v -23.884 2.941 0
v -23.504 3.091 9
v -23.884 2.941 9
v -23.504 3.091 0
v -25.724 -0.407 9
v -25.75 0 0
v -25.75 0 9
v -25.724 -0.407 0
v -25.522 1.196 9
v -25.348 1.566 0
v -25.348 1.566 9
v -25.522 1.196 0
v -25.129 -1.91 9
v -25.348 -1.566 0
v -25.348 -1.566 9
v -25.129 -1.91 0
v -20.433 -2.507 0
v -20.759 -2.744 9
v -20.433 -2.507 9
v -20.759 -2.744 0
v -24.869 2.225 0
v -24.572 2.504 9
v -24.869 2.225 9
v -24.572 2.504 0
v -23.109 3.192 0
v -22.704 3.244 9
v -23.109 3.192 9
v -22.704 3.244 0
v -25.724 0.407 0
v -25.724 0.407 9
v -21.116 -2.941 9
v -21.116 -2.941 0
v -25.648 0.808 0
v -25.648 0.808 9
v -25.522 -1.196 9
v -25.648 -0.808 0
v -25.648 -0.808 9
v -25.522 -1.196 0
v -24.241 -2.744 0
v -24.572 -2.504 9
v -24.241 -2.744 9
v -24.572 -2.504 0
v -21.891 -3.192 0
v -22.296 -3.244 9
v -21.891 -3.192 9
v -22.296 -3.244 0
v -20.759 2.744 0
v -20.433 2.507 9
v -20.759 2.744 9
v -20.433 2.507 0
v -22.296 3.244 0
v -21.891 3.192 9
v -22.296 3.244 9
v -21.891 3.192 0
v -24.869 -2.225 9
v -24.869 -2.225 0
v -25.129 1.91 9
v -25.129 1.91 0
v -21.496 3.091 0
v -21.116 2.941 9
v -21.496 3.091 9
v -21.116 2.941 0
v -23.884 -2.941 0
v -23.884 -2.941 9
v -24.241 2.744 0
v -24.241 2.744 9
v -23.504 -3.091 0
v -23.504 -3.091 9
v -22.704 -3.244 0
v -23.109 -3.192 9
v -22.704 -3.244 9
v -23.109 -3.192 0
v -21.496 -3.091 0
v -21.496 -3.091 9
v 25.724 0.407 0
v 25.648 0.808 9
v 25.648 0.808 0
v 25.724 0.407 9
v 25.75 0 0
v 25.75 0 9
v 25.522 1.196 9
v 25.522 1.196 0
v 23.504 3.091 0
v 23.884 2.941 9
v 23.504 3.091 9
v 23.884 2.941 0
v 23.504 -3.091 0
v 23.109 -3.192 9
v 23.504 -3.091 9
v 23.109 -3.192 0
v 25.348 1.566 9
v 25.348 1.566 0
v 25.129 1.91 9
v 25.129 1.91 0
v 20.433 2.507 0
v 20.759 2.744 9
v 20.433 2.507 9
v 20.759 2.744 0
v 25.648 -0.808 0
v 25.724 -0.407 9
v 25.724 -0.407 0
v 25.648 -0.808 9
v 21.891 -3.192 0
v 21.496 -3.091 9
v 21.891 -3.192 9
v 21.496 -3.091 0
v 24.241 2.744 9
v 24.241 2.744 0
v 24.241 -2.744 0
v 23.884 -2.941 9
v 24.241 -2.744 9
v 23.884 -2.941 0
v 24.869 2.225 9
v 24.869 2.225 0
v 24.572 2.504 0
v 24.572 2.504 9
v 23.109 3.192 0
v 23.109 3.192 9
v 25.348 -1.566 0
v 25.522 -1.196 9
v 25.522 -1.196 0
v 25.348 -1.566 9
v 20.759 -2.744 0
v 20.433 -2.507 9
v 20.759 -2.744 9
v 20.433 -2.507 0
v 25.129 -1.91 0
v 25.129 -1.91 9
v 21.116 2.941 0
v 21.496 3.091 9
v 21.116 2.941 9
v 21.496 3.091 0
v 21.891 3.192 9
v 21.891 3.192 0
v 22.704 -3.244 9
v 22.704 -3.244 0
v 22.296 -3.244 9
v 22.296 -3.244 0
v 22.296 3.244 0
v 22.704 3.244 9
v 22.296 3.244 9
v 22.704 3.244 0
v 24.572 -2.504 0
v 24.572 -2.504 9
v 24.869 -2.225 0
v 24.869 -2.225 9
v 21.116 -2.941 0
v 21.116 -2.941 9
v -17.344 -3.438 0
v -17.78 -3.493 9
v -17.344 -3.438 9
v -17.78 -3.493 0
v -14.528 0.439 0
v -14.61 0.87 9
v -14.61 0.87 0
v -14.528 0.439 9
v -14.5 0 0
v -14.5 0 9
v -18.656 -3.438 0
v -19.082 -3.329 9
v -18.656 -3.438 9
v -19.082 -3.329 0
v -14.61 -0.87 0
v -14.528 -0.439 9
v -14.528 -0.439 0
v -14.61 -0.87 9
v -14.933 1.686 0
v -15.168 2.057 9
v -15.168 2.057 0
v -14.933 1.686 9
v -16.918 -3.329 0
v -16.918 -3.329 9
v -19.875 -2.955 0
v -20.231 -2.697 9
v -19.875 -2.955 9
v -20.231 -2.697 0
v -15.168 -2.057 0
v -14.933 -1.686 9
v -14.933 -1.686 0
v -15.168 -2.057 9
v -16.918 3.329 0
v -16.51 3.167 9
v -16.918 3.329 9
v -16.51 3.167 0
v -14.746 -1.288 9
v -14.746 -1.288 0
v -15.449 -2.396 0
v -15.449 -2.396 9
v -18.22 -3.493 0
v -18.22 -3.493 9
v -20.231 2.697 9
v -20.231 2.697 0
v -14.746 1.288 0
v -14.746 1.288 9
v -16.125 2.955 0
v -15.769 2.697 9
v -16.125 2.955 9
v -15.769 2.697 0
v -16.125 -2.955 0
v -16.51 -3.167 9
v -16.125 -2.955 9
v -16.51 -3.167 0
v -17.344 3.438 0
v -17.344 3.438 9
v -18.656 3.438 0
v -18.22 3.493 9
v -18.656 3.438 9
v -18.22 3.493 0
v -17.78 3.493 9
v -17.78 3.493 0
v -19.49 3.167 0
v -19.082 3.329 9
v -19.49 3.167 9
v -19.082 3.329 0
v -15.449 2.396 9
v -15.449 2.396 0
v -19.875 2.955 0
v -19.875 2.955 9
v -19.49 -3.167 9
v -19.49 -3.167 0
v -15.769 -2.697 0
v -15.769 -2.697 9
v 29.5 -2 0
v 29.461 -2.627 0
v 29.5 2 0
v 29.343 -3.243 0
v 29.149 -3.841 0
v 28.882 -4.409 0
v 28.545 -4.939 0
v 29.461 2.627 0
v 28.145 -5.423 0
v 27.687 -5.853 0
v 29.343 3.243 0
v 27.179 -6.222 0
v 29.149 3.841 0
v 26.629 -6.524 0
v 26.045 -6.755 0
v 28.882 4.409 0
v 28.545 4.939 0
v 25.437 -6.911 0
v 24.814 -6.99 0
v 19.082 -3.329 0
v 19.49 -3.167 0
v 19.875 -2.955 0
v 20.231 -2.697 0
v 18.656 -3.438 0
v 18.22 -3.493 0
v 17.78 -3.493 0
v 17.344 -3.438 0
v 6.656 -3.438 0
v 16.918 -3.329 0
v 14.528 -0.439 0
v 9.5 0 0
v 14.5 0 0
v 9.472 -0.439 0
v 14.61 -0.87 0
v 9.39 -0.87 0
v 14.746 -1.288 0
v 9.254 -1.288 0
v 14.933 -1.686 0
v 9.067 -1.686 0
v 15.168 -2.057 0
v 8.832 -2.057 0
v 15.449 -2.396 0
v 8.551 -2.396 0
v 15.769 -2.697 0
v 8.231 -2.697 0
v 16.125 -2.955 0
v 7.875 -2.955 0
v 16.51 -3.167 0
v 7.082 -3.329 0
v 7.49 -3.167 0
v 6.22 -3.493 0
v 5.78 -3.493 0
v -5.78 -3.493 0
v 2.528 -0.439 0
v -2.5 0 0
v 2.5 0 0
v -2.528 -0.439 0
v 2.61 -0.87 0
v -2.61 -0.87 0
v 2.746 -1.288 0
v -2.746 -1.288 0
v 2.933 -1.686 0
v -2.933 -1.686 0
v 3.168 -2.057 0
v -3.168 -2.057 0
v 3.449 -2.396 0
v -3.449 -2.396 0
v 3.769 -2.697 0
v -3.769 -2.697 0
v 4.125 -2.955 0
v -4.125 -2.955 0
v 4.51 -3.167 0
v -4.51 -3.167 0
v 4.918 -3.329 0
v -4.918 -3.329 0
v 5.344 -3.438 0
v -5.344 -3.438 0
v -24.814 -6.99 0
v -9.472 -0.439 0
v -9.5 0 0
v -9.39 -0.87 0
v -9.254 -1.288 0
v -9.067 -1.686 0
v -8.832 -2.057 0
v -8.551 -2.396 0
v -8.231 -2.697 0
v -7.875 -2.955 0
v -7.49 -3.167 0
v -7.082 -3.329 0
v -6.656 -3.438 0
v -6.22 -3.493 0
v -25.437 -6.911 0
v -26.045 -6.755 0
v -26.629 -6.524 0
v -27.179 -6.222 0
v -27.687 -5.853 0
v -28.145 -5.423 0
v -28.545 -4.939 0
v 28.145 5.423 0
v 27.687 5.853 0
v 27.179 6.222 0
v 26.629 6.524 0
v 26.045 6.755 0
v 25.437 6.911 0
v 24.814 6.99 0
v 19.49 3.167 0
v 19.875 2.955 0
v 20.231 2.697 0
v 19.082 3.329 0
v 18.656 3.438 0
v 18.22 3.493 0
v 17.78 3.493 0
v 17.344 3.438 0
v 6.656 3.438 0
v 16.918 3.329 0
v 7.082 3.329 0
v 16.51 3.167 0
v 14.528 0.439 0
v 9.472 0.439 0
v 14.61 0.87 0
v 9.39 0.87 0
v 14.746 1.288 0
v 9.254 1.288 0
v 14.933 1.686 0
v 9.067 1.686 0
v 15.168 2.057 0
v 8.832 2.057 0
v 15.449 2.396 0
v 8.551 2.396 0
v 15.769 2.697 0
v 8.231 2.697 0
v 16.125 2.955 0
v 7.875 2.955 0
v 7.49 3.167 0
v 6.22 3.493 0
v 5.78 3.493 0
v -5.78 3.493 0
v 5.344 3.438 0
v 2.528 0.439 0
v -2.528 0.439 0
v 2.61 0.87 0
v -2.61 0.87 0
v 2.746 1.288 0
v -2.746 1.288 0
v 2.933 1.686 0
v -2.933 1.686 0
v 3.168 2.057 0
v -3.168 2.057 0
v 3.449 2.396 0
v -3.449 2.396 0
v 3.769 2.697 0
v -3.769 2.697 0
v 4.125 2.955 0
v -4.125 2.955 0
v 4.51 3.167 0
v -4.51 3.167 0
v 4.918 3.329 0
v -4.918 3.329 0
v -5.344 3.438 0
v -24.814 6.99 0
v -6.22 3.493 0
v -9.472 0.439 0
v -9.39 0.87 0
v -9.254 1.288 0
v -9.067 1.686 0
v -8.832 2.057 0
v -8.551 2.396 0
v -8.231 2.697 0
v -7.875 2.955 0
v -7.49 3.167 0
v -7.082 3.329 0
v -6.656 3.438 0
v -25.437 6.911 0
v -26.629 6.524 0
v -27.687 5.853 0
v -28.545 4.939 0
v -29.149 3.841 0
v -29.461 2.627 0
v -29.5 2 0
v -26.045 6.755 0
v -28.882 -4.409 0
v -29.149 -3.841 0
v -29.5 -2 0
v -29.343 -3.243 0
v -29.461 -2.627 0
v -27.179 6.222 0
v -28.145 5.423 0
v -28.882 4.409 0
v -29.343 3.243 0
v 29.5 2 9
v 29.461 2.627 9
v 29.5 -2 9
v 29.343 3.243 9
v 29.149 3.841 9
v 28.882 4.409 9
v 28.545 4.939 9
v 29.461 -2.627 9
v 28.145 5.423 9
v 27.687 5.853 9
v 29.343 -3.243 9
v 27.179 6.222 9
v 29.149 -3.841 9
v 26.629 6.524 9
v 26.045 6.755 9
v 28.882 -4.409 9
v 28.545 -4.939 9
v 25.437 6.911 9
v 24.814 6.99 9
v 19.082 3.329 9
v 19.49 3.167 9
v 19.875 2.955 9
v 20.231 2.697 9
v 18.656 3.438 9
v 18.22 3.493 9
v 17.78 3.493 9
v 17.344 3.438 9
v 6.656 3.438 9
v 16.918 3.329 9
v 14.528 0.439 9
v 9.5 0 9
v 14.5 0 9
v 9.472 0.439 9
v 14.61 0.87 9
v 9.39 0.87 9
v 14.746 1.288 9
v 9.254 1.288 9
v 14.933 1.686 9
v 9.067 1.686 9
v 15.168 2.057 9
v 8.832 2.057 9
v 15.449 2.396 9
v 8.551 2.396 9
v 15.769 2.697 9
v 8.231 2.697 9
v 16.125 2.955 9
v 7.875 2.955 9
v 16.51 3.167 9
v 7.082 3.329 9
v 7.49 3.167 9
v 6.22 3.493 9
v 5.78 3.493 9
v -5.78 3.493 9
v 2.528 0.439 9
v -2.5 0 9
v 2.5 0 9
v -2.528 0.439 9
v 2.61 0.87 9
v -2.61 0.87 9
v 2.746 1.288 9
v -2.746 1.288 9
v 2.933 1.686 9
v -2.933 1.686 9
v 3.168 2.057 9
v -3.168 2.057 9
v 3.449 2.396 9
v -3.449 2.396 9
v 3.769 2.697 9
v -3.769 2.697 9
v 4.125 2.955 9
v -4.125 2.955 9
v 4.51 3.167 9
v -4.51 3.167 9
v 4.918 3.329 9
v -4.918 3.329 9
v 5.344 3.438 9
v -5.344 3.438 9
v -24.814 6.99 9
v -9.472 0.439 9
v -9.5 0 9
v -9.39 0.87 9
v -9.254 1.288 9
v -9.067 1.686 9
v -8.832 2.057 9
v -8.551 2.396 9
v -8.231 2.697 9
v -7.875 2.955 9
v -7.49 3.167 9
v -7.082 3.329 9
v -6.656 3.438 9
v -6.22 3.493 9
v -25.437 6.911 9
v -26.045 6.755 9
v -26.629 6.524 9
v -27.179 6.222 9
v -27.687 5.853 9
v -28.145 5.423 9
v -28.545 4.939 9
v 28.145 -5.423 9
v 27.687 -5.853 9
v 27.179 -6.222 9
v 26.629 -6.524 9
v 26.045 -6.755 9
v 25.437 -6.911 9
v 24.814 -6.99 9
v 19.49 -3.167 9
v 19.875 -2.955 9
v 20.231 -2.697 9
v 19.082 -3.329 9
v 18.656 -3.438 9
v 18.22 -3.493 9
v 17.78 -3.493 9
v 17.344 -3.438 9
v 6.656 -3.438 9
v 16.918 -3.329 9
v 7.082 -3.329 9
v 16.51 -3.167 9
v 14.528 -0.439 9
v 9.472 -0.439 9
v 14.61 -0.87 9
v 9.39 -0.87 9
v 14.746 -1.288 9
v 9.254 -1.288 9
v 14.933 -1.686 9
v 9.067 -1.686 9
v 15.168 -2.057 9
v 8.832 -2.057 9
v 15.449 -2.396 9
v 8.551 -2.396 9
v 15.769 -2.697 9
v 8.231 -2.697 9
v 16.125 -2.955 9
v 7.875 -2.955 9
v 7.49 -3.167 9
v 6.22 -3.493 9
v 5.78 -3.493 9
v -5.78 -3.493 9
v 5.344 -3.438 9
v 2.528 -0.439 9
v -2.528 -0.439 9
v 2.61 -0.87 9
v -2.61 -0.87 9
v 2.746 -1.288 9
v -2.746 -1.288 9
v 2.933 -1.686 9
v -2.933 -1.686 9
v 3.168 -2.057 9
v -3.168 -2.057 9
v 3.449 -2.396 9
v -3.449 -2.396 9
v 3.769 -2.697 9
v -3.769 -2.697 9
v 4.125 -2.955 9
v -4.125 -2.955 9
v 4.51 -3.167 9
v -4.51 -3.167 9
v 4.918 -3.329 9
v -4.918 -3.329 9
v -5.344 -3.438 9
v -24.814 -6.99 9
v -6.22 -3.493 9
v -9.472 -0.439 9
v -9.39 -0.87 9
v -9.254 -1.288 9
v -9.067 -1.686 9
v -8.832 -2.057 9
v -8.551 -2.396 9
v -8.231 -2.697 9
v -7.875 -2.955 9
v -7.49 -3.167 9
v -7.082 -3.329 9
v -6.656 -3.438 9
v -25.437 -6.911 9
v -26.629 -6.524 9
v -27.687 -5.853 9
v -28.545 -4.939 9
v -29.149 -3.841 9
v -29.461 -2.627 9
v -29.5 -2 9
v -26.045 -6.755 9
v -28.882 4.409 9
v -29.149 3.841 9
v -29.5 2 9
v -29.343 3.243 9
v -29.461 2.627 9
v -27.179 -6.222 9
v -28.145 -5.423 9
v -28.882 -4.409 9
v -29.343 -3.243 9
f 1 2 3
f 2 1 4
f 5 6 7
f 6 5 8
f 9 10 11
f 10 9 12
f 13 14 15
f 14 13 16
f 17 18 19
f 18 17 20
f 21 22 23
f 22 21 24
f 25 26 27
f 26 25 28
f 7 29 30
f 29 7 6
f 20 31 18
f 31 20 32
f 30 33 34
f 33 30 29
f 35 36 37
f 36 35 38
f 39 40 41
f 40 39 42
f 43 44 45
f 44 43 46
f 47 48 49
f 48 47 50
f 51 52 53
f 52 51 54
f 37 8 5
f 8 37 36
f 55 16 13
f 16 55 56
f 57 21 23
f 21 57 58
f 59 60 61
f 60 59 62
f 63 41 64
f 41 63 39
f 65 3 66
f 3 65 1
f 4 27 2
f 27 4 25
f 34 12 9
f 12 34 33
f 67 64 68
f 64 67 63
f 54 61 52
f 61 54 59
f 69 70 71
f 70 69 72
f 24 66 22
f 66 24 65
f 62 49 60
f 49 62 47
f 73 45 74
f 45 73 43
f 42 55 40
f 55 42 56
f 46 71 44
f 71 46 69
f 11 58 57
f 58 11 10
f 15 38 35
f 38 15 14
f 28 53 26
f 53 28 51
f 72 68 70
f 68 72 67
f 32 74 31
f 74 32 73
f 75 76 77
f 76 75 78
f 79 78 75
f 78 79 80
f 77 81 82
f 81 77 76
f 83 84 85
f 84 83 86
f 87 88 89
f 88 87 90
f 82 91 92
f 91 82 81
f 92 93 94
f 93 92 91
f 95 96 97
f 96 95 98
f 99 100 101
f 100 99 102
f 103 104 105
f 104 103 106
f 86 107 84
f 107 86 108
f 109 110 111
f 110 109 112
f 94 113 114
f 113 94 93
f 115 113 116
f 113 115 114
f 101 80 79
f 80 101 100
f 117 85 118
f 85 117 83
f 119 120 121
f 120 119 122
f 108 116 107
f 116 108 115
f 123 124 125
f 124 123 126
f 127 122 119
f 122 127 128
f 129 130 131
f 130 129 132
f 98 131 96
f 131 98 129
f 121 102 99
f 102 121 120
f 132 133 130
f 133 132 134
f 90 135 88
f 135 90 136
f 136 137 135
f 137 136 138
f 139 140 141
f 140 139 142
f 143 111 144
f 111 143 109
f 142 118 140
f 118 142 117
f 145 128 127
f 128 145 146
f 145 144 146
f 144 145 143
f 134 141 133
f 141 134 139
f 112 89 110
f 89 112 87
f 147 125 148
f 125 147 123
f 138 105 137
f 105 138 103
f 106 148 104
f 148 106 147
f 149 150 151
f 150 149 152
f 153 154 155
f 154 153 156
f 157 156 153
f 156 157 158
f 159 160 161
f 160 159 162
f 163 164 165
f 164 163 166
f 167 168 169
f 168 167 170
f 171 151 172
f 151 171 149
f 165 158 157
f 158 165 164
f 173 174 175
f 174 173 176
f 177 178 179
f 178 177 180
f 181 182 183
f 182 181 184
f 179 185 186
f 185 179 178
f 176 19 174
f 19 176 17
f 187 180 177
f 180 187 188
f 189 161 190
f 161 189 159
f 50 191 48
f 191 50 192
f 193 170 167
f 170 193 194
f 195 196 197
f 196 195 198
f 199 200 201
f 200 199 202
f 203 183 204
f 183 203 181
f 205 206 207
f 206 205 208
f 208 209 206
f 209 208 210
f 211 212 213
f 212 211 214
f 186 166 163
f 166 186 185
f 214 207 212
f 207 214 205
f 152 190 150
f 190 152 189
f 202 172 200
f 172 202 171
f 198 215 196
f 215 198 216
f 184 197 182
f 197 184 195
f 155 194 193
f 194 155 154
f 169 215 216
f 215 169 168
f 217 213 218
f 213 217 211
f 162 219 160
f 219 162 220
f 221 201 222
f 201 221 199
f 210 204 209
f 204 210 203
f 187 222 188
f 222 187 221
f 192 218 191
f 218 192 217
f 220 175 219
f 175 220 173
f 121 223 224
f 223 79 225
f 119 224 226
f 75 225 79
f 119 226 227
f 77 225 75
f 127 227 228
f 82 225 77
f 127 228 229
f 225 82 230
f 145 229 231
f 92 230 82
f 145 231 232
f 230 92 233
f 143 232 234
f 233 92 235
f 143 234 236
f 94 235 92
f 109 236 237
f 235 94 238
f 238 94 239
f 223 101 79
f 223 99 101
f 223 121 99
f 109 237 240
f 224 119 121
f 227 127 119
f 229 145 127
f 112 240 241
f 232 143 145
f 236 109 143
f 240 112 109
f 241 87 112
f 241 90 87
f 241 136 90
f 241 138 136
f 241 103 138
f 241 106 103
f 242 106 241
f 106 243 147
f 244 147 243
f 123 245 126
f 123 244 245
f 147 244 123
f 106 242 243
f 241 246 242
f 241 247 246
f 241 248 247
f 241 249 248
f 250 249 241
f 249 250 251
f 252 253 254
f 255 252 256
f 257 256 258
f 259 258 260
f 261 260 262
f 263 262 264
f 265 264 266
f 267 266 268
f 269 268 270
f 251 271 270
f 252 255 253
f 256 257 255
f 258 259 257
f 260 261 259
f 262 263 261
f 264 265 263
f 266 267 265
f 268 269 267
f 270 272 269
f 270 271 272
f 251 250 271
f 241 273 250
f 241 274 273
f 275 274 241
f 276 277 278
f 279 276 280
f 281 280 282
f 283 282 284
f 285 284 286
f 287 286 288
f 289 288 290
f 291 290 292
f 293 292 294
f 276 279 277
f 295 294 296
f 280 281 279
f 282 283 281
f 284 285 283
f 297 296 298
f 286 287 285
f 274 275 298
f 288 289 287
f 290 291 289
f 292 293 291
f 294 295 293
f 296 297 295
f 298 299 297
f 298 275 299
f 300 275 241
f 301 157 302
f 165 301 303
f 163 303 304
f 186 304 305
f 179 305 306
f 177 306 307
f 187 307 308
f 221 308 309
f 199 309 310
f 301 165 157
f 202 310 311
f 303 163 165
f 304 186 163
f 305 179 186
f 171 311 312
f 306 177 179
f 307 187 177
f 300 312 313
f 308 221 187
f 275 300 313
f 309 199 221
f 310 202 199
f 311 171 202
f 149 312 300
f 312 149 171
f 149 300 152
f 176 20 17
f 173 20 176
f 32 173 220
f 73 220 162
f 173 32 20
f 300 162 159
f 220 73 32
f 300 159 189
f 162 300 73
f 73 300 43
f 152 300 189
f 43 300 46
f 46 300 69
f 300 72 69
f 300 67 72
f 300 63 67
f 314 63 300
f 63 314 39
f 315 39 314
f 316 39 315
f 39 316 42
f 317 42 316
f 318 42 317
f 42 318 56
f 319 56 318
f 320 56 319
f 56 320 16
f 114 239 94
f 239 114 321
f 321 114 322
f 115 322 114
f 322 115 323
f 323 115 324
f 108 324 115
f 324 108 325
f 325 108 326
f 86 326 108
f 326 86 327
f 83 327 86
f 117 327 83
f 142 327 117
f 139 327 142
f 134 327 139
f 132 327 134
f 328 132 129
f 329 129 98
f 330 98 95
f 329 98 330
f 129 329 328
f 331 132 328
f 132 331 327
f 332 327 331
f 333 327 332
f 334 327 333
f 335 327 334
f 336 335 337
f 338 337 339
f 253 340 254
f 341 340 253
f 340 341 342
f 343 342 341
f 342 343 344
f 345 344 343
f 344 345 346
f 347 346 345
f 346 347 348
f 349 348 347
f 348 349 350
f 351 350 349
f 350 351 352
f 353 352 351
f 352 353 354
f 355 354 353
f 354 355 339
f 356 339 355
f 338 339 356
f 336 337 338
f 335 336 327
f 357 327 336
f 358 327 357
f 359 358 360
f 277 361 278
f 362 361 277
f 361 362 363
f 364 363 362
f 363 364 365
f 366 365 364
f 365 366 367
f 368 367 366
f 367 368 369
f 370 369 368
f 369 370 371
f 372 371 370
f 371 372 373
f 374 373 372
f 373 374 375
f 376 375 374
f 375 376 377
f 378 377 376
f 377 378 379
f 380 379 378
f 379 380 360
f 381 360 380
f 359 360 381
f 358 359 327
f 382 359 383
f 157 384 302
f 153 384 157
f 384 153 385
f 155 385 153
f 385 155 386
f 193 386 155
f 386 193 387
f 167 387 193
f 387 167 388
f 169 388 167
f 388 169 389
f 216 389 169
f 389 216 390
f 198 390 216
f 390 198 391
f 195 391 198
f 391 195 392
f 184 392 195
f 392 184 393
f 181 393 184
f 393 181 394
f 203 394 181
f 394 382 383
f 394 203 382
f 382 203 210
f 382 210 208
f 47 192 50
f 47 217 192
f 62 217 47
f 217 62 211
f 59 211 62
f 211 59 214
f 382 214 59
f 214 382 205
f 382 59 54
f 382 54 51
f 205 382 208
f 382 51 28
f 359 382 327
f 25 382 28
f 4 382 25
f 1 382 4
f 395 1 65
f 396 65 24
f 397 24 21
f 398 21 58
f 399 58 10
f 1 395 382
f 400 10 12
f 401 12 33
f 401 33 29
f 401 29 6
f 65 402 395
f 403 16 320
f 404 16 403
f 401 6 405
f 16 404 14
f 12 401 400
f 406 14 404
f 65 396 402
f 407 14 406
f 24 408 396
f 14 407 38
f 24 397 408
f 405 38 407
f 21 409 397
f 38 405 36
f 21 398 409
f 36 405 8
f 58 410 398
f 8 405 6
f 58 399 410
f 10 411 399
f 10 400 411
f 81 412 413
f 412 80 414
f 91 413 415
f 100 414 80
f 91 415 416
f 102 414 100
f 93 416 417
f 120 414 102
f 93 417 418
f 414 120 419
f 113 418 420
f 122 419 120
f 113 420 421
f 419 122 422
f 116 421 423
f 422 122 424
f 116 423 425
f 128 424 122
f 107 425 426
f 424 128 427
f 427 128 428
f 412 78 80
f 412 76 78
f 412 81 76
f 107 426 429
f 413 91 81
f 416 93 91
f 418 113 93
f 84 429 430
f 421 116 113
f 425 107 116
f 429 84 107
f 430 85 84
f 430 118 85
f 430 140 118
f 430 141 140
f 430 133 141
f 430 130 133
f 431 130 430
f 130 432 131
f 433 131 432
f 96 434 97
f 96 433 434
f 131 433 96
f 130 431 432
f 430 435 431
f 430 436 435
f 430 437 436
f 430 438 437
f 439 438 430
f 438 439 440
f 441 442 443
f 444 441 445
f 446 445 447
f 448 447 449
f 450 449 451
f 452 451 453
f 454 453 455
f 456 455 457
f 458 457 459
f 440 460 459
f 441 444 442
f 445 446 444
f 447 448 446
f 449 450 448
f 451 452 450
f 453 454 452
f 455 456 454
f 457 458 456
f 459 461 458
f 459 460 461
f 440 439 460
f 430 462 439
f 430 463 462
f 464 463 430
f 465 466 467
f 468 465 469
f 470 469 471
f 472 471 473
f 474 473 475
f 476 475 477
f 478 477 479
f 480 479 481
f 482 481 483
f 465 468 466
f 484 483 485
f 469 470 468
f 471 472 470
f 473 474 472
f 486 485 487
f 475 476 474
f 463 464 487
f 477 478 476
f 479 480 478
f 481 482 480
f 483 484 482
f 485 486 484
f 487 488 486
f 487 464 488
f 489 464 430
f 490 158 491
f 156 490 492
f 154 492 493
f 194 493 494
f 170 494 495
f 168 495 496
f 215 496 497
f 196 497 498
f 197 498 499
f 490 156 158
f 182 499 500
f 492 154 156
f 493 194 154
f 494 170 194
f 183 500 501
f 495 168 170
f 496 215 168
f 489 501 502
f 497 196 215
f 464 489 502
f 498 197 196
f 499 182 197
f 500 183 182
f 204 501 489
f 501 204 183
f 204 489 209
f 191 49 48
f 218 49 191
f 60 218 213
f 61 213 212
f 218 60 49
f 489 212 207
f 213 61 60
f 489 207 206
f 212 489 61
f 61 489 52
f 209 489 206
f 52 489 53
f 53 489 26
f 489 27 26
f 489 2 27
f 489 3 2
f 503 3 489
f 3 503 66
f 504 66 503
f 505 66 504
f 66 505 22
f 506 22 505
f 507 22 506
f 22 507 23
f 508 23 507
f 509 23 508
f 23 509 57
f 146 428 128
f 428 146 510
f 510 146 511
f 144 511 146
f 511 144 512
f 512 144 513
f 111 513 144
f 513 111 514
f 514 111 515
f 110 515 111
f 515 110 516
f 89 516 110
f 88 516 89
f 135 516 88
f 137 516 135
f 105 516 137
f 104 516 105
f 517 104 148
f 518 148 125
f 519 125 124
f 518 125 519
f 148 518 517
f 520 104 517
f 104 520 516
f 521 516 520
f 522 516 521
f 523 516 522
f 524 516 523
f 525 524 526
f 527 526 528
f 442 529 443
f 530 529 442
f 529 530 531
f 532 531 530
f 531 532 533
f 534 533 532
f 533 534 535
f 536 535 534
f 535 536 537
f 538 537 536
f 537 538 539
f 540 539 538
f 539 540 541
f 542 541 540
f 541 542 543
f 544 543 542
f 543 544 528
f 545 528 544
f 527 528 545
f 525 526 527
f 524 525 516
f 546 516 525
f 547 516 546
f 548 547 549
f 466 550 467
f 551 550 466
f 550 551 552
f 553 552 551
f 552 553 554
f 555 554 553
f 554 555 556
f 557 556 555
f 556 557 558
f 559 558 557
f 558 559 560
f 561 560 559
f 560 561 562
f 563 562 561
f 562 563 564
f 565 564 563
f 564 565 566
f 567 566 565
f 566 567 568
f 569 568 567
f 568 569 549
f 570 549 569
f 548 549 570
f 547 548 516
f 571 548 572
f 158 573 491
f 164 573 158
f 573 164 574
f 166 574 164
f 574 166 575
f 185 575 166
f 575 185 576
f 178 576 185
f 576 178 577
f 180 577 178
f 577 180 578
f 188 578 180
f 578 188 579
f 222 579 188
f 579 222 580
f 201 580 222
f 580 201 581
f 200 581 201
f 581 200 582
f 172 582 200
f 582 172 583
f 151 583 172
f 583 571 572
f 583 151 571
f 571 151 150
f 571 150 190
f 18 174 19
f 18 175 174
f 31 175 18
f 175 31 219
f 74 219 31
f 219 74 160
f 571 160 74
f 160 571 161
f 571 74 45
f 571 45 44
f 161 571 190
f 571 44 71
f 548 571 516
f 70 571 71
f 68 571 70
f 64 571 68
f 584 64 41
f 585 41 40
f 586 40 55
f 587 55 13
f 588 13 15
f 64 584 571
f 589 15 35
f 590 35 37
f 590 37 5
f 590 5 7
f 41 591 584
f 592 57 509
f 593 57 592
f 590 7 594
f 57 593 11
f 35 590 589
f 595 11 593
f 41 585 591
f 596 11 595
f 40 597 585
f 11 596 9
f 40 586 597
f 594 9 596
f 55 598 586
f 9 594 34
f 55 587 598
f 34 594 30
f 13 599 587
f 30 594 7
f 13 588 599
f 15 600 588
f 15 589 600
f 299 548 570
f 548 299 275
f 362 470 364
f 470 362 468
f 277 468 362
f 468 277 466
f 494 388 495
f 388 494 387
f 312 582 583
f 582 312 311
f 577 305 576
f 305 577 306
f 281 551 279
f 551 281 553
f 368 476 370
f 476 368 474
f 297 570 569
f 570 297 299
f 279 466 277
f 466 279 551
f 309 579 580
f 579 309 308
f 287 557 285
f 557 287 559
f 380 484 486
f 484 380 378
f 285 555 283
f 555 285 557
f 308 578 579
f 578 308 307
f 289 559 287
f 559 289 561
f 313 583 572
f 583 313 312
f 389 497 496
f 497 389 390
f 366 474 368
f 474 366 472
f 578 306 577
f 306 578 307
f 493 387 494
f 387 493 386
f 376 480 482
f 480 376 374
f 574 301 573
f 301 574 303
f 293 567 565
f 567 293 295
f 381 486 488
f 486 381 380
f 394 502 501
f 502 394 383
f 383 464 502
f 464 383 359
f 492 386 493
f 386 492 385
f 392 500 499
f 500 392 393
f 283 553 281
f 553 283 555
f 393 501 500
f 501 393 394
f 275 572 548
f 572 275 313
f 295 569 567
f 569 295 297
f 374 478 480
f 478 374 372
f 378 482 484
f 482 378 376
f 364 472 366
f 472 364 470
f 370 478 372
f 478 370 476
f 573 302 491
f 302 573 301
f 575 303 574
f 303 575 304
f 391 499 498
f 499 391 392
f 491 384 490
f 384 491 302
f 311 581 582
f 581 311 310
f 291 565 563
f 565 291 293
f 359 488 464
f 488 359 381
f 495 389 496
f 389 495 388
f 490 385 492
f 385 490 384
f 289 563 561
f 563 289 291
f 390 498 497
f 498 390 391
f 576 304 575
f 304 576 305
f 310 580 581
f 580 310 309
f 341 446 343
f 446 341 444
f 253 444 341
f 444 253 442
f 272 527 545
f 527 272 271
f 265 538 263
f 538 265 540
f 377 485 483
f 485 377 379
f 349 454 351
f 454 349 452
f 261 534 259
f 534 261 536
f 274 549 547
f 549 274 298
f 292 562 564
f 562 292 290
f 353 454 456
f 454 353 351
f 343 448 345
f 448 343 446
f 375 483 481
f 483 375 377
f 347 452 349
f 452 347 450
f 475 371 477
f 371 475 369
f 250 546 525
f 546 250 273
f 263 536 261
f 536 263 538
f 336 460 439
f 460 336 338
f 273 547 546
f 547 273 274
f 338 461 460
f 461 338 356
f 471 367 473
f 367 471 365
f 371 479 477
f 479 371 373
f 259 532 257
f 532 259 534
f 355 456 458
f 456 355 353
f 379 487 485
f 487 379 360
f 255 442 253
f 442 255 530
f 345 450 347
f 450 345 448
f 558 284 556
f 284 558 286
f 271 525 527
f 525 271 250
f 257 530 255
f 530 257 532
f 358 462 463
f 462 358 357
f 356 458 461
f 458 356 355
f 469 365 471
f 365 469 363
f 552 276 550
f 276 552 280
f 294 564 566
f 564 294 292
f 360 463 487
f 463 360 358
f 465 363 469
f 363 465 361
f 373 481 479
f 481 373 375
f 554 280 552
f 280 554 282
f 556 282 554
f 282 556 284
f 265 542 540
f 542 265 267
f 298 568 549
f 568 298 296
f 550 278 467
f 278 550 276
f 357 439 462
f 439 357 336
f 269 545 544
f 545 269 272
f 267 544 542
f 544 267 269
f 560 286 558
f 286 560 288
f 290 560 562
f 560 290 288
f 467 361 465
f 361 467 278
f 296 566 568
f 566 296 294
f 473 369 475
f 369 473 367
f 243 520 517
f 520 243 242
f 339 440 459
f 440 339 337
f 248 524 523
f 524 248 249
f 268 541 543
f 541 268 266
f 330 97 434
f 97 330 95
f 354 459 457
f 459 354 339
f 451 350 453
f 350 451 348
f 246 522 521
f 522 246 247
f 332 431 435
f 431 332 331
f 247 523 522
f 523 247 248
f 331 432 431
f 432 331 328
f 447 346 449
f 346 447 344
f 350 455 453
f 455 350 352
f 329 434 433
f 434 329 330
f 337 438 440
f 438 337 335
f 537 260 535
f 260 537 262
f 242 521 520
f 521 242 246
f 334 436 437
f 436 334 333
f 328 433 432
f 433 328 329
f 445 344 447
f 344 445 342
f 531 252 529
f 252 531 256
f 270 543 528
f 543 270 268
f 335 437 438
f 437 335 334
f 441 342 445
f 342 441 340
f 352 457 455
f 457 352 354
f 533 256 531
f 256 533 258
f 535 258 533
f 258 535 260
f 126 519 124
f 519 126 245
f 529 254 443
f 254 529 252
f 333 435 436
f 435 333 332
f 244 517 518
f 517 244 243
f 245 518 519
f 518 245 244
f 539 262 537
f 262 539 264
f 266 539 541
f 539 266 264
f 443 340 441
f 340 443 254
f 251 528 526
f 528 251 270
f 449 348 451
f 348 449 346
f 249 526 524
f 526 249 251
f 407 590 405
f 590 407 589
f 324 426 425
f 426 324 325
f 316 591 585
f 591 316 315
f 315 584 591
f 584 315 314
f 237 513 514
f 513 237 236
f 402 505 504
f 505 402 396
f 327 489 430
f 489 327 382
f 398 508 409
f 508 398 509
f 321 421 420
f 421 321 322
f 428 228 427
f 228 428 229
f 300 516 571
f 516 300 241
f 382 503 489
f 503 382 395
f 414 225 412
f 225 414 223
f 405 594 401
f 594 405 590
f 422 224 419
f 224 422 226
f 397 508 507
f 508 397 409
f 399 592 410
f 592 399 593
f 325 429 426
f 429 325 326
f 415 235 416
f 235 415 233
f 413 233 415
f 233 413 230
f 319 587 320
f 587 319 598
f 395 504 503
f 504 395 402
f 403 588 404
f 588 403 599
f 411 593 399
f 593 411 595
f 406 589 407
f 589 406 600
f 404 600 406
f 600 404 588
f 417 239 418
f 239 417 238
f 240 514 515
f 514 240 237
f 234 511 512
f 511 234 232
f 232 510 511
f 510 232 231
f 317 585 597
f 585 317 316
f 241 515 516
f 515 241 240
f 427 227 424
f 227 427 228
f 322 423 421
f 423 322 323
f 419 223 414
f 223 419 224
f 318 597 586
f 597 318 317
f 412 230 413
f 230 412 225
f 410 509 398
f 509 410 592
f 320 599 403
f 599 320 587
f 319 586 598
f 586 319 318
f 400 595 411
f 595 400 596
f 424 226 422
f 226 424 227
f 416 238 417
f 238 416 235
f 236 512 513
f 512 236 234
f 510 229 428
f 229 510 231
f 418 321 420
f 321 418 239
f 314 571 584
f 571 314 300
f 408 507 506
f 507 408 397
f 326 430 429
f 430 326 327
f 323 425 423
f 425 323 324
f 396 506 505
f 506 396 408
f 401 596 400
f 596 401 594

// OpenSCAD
$fn = 50;


difference() {
	union() {
		hull() {
			translate(v = [-24.5000000000, 2.0000000000, 0]) {
				cylinder(h = 9, r = 5);
			}
			translate(v = [24.5000000000, 2.0000000000, 0]) {
				cylinder(h = 9, r = 5);
			}
			translate(v = [-24.5000000000, -2.0000000000, 0]) {
				cylinder(h = 9, r = 5);
			}
			translate(v = [24.5000000000, -2.0000000000, 0]) {
				cylinder(h = 9, r = 5);
			}
		}
	}
	union() {
		#translate(v = [-22.5000000000, 0.0000000000, -100.0000000000]) {
			cylinder(h = 200, r = 3.2500000000);
		}
		#translate(v = [-22.5000000000, 0.0000000000, -100.0000000000]) {
			cylinder(h = 200, r = 3.2500000000);
		}
		#translate(v = [22.5000000000, 0.0000000000, -100.0000000000]) {
			cylinder(h = 200, r = 3.2500000000);
		}
		#translate(v = [22.5000000000, 0.0000000000, -100.0000000000]) {
			cylinder(h = 200, r = 3.2500000000);
		}
		#translate(v = [-18.0000000000, 0, 0]) {
			cylinder(h = 9, r = 3.5000000000);
		}
		#translate(v = [-6.0000000000, 0, 0]) {
			cylinder(h = 9, r = 3.5000000000);
		}
		#translate(v = [6.0000000000, 0, 0]) {
			cylinder(h = 9, r = 3.5000000000);
		}
		#translate(v = [18.0000000000, 0, 0]) {
			cylinder(h = 9, r = 3.5000000000);
		}
	}
}
